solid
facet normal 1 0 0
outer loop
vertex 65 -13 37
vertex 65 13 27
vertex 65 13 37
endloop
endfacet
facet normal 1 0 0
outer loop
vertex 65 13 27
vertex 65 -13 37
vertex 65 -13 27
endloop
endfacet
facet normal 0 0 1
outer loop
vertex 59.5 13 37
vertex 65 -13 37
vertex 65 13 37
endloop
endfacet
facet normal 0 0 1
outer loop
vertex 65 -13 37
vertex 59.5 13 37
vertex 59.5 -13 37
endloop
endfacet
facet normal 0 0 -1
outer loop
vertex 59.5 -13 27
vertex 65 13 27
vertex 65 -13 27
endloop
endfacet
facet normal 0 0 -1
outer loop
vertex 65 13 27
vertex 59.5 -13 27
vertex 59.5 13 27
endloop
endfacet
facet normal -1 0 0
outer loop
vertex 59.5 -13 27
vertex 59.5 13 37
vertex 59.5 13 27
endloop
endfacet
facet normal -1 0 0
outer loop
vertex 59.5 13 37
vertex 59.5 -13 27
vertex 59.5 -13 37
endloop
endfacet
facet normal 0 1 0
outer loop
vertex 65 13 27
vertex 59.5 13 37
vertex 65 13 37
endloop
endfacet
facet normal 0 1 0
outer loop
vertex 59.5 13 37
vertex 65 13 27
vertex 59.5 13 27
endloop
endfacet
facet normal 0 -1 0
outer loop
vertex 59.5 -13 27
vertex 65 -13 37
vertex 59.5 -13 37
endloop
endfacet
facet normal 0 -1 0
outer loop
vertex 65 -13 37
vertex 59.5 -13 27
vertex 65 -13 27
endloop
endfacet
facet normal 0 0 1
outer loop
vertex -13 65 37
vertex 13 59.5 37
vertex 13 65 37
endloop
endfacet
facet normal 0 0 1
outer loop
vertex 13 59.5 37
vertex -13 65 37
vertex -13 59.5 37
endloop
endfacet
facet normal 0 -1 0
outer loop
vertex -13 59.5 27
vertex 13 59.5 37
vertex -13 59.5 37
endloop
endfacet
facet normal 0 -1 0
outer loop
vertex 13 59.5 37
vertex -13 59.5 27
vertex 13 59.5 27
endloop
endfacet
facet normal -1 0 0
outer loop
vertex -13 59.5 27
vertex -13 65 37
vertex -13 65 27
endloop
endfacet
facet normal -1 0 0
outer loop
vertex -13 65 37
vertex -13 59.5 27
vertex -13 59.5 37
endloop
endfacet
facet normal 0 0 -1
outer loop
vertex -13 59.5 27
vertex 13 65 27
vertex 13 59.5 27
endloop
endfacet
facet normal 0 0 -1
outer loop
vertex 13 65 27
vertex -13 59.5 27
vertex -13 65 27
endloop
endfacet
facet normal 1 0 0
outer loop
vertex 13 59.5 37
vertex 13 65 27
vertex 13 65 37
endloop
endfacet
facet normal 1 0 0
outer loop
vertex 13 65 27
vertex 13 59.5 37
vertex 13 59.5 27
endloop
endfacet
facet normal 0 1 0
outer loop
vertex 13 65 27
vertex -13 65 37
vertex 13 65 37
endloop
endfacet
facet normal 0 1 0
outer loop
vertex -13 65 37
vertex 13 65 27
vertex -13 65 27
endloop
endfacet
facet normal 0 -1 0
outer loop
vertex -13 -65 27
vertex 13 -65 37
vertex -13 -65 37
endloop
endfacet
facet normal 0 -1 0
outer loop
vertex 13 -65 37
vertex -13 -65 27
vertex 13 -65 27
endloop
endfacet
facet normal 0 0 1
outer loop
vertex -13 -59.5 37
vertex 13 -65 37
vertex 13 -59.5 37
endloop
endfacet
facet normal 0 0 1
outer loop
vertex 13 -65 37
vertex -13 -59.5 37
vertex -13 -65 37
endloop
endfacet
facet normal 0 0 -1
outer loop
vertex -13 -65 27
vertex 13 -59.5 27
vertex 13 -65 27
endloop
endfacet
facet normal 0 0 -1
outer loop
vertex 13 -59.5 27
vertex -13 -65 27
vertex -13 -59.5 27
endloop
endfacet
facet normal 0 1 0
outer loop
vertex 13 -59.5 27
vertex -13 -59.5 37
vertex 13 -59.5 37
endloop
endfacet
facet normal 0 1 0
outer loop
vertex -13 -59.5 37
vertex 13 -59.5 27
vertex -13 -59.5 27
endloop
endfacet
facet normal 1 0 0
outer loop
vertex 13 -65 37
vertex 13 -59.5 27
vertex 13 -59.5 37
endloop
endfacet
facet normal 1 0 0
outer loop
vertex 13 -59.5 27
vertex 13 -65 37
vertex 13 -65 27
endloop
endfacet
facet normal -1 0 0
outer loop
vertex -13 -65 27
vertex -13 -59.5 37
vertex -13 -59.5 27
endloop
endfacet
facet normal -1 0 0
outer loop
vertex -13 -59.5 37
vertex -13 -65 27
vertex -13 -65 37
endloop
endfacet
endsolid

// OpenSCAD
// ============================================================================
// Atom Lithography Machine — Parametric OpenSCAD Module (S4.4-03)
// ============================================================================
// part_id           : S4.4-03
// parent_bom_id     : S4.4
// subsystem         : S4
// part_name         : Zerodur/ULE yuksek duzlemlikli yonga-tasiyici bar aynalari
// material          : Zerodur
// temp_stage        : 4 K - 300 K
// vacuum_grade      : UHV 1e-9 mbar
// tolerance         : lambda/20
// computed_mass_kg  : 0.03833
// envelope_mm       : 78.000 x 130.000 x 41.000
// design_maturity   : M0_M1_DETAILED_CAD_DESIGN_ONLY
// no_lab_measurement: true
// iec61508_certified: false
// semi_s2_certified : false
// Units: millimeters (mm)
// ============================================================================

$fn = 64;

// Nominal bounding envelope parameters (mm)
bbox_x = 78.0000;
bbox_y = 130.0000;
bbox_z = 41.0000;

// Part-specific parametric dimensions
n_mirrors = 3;
bar_len_mm = 26.0;
bar_thk_mm = 5.5;
bar_h_mm = 10.0;
mirror_r_face_mm = 65.0;
mirror_z_nat_mm = -9.0;

// Interface / port parameters (mm)

module part_S4_4_03() {
  union() {
    // Split-gap Zerodur lambda/20 bar mirror X-axis (Z_canon=491 mm)
    translate([62.250, 0.000, 32.000]) cube([5.500, 26.000, 10.000], center=true);
    // Split-gap Zerodur lambda/20 bar mirror Y-axis (Z_canon=491 mm)
    translate([0.000, 62.250, 32.000]) rotate([0.000, 0.000, 90.000]) cube([5.500, 26.000, 10.000], center=true);
    // Split-gap Zerodur lambda/20 bar mirror Z-axis (Z_canon=491 mm)
    translate([-0.000, -62.250, 32.000]) rotate([0.000, 0.000, 270.000]) cube([5.500, 26.000, 10.000], center=true);
  }
}

// World assembly mounting transform (global machine frame, mm / deg):
// translate([0.000, 0.000, -41.000]) rotate([0.000, 0.000, 0.000]) part_S4_4_03();

part_S4_4_03();
